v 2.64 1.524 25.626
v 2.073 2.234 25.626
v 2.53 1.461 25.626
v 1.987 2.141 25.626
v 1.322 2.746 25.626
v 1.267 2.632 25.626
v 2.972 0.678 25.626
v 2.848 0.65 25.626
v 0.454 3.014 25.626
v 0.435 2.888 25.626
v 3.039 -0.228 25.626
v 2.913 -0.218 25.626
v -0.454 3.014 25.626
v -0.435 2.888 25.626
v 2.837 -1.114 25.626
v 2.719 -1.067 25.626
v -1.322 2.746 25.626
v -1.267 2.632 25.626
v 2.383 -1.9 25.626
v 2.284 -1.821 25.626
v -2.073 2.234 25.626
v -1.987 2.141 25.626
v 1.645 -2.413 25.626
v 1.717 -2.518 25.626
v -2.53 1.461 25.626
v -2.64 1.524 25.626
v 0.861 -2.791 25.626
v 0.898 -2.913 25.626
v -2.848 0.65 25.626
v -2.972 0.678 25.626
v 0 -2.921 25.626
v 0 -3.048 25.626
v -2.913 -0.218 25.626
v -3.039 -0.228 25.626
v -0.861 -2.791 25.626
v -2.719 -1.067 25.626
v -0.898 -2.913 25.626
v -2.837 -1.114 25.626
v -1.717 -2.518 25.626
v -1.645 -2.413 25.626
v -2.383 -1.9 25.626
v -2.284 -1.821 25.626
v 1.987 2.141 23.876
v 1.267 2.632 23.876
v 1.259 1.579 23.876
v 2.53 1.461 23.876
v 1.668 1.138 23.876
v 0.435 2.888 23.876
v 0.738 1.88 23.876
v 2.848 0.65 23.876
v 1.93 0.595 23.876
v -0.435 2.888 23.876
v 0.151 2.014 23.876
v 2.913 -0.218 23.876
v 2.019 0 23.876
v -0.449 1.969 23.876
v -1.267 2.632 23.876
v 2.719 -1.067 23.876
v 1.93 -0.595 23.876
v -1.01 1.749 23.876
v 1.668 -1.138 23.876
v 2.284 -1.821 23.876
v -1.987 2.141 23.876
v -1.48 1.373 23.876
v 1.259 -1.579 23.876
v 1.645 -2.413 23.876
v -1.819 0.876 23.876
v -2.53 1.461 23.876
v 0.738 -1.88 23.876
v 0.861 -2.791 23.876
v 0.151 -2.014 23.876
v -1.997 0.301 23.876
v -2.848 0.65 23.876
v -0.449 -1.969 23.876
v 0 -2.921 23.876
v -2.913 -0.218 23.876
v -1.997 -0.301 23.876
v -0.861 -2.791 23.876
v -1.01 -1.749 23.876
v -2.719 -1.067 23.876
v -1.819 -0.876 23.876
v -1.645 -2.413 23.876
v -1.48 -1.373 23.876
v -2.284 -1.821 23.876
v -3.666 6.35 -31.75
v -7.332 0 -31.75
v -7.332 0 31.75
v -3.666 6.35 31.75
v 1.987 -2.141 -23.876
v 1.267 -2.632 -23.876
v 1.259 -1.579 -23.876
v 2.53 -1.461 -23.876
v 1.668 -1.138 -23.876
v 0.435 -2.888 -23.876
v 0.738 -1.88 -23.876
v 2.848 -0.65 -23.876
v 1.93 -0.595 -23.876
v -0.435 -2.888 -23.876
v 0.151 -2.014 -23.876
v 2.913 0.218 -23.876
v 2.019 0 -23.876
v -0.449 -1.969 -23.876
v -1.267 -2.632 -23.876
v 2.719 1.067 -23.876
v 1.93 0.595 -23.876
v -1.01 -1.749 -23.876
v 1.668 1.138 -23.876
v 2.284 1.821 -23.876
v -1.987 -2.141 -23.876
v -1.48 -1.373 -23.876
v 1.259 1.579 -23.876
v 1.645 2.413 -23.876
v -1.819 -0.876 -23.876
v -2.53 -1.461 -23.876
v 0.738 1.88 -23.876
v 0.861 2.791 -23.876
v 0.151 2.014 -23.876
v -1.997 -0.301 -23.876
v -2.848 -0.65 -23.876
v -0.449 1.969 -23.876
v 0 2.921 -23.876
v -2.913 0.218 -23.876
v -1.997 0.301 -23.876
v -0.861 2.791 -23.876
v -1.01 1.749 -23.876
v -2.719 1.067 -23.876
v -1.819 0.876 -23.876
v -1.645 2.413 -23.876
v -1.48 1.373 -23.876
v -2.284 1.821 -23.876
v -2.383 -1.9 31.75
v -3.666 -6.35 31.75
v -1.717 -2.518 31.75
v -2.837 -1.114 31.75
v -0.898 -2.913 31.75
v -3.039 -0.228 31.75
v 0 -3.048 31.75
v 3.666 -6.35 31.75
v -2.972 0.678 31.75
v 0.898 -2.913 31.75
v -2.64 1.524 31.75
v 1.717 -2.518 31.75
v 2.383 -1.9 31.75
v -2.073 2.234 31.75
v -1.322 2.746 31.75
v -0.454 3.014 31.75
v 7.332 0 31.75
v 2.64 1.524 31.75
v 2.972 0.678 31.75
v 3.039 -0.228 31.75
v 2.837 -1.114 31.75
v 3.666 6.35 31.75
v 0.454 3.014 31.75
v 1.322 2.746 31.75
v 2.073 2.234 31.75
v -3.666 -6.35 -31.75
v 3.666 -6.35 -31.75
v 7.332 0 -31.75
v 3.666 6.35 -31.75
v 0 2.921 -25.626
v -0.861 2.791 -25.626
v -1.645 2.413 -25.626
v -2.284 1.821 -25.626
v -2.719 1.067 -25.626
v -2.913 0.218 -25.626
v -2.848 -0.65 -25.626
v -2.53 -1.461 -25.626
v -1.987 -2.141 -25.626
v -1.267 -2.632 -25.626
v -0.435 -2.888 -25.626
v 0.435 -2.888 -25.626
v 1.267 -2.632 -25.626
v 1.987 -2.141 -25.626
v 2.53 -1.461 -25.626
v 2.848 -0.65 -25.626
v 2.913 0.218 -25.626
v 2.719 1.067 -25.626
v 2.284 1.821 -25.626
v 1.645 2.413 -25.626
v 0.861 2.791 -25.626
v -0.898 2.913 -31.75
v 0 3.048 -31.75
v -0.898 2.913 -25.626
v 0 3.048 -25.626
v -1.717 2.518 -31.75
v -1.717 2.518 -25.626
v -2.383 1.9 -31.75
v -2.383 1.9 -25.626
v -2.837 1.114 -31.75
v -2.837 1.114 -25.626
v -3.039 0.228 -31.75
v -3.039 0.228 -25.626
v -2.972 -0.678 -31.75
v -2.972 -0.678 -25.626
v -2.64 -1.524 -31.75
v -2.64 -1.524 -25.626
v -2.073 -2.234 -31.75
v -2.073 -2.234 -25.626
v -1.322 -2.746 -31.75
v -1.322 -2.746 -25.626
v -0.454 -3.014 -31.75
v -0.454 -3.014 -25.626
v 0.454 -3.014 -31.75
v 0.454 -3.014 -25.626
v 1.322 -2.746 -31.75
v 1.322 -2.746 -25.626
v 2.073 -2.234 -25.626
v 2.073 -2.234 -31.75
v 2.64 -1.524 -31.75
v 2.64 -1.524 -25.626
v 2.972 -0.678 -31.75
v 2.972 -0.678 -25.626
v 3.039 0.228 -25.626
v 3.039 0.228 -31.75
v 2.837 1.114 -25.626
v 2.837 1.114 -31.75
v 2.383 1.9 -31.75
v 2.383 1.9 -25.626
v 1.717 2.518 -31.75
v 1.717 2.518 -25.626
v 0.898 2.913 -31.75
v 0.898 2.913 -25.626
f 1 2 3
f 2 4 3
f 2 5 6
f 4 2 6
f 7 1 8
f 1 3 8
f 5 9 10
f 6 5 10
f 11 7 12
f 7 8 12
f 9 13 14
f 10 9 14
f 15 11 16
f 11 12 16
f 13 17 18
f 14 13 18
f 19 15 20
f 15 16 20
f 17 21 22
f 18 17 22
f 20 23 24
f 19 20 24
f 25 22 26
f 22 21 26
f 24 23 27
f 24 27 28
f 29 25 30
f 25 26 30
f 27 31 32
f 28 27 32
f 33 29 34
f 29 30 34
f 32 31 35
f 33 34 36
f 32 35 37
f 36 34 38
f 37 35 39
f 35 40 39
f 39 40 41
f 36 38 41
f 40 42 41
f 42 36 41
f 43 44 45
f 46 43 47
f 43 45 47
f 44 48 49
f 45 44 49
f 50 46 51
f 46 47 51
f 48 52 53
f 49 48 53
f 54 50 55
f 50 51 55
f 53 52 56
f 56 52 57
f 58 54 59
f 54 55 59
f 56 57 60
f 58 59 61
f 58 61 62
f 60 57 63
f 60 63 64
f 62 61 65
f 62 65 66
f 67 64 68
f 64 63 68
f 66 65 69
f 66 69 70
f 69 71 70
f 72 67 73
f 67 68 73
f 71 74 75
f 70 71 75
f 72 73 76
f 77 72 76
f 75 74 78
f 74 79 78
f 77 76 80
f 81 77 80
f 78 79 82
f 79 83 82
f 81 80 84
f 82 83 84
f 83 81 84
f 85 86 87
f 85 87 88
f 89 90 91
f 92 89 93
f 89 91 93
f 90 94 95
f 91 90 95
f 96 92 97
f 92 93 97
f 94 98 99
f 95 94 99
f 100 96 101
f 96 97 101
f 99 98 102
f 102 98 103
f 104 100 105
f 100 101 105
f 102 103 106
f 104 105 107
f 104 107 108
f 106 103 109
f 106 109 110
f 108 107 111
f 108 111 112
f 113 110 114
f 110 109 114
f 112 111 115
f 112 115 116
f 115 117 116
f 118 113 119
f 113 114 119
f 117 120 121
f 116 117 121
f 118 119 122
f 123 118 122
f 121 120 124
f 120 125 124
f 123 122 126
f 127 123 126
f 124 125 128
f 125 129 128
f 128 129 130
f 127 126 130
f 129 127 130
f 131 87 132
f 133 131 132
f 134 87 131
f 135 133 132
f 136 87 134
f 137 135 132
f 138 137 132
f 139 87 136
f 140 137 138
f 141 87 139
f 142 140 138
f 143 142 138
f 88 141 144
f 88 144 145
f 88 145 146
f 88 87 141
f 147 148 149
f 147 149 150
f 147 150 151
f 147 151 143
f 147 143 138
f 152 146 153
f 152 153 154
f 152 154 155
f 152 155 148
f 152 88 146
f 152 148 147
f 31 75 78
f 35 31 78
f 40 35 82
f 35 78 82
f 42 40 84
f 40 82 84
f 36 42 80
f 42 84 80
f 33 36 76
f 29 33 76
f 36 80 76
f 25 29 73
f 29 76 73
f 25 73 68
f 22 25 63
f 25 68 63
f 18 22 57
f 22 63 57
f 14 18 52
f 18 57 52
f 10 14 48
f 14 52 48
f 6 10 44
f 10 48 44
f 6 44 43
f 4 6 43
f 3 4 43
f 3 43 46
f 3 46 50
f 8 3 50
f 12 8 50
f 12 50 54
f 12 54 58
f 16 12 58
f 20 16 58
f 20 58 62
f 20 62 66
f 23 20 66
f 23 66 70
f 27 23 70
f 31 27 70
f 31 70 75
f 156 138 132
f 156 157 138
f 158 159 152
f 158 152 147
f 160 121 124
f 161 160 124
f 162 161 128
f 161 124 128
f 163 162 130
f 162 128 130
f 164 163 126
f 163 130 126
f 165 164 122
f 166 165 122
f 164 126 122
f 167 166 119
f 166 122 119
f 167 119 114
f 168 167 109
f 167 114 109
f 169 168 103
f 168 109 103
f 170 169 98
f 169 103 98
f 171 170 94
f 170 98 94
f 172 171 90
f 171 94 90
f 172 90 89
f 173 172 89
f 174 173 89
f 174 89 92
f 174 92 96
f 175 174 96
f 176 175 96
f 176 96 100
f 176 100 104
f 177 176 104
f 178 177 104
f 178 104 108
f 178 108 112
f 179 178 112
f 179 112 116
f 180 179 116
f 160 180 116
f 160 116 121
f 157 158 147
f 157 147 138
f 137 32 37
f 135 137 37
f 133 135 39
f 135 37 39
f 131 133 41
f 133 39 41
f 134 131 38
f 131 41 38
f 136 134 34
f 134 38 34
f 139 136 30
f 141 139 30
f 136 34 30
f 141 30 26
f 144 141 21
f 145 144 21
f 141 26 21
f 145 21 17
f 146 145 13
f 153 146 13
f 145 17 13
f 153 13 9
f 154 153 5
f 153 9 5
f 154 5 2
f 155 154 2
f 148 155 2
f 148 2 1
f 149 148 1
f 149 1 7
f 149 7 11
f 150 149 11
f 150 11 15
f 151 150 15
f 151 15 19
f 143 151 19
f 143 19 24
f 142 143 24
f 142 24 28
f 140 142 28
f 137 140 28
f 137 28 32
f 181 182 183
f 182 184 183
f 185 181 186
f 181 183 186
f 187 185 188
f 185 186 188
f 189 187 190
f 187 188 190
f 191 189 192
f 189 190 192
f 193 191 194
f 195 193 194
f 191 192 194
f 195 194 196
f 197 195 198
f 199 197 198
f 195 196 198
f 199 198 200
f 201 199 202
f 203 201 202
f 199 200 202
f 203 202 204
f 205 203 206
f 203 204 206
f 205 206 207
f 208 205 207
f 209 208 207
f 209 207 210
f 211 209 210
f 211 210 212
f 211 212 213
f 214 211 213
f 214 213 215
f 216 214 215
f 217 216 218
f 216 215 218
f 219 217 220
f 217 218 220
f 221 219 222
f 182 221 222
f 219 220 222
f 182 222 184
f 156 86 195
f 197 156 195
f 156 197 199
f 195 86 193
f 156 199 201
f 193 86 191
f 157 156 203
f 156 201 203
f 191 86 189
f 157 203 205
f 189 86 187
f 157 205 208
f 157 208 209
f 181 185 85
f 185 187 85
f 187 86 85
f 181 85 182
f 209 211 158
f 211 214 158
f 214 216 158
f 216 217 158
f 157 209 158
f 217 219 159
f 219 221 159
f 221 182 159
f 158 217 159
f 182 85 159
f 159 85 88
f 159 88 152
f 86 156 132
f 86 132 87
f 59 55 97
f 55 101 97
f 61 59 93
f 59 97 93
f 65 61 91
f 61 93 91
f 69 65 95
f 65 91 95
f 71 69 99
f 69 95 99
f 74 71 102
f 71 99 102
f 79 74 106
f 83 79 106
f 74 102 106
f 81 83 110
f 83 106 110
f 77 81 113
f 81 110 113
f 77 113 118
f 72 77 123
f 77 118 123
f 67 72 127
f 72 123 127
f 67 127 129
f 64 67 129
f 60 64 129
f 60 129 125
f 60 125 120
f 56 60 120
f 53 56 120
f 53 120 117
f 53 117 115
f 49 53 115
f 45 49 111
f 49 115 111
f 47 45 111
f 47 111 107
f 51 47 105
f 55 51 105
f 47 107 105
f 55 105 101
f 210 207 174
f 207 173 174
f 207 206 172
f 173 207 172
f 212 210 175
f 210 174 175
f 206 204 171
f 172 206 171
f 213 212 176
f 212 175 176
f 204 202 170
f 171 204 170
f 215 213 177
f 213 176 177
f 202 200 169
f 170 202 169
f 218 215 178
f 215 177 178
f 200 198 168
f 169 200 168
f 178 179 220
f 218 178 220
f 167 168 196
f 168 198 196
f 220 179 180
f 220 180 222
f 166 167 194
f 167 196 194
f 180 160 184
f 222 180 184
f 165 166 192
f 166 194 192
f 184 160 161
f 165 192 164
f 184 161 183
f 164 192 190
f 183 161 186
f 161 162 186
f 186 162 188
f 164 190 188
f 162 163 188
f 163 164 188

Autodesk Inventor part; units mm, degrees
ref_plane "YZ Plane" through (0, 0, 0) normal (1, 0, 0) x (0, 1, 0)
ref_plane "XZ Plane" through (0, 0, 0) normal (0, 1, 0) x (-1, 0, 0)
ref_plane "XY Plane" through (0, 0, 0) normal (0, 0, 1) x (1, 0, 0)
sketch "Sketch1" plane through (0, 0, 0) normal (0, 0, 1) x (1, 0, 0)
  line L0 (3.6662, 6.35) -> (7.3323, 0)
  line L1 (7.3323, 0) -> (3.6662, -6.35)
  line L2 (3.6662, -6.35) -> (-3.6662, -6.35)
  line L3 (-3.6662, -6.35) -> (-7.3323, 0)
  line L4 (-7.3323, 0) -> (-3.6662, 6.35)
  line L5 (-3.6662, 6.35) -> (3.6662, 6.35)
  circle A0 centre (0, 0) radius 2.0193
  dimension "d0" = 12.7
  dimension "d3" = 4.0386
extrude "Extrusion2" add sketch "Sketch1" along normal mid plane 63.5
sketch "Sketch2" plane through (0, 0, 31.75) normal (0, 0, 1) x (1, 0, 0)
  point P0 (0, 0)
  point P1 (0, 0)
hole "Hole1" at (0, 0, 31.75) direction (0, 0, -1) diameter 5.842 depth 7.874 counterbore diameter 6.096 counterbore depth 6.1239
sketch "Sketch3" plane through (0, 0, -31.75) normal (0, 0, -1) x (-1, 0, 0)
  point P0 (0, 0)
  point P1 (0, 0)
hole "Hole2" at (0, 0, -31.75) direction (0, 0, 1) diameter 5.842 depth 7.874 counterbore diameter 6.096 counterbore depth 6.1239
properties part number "1_2 x 2_500-inchHexShaft"
